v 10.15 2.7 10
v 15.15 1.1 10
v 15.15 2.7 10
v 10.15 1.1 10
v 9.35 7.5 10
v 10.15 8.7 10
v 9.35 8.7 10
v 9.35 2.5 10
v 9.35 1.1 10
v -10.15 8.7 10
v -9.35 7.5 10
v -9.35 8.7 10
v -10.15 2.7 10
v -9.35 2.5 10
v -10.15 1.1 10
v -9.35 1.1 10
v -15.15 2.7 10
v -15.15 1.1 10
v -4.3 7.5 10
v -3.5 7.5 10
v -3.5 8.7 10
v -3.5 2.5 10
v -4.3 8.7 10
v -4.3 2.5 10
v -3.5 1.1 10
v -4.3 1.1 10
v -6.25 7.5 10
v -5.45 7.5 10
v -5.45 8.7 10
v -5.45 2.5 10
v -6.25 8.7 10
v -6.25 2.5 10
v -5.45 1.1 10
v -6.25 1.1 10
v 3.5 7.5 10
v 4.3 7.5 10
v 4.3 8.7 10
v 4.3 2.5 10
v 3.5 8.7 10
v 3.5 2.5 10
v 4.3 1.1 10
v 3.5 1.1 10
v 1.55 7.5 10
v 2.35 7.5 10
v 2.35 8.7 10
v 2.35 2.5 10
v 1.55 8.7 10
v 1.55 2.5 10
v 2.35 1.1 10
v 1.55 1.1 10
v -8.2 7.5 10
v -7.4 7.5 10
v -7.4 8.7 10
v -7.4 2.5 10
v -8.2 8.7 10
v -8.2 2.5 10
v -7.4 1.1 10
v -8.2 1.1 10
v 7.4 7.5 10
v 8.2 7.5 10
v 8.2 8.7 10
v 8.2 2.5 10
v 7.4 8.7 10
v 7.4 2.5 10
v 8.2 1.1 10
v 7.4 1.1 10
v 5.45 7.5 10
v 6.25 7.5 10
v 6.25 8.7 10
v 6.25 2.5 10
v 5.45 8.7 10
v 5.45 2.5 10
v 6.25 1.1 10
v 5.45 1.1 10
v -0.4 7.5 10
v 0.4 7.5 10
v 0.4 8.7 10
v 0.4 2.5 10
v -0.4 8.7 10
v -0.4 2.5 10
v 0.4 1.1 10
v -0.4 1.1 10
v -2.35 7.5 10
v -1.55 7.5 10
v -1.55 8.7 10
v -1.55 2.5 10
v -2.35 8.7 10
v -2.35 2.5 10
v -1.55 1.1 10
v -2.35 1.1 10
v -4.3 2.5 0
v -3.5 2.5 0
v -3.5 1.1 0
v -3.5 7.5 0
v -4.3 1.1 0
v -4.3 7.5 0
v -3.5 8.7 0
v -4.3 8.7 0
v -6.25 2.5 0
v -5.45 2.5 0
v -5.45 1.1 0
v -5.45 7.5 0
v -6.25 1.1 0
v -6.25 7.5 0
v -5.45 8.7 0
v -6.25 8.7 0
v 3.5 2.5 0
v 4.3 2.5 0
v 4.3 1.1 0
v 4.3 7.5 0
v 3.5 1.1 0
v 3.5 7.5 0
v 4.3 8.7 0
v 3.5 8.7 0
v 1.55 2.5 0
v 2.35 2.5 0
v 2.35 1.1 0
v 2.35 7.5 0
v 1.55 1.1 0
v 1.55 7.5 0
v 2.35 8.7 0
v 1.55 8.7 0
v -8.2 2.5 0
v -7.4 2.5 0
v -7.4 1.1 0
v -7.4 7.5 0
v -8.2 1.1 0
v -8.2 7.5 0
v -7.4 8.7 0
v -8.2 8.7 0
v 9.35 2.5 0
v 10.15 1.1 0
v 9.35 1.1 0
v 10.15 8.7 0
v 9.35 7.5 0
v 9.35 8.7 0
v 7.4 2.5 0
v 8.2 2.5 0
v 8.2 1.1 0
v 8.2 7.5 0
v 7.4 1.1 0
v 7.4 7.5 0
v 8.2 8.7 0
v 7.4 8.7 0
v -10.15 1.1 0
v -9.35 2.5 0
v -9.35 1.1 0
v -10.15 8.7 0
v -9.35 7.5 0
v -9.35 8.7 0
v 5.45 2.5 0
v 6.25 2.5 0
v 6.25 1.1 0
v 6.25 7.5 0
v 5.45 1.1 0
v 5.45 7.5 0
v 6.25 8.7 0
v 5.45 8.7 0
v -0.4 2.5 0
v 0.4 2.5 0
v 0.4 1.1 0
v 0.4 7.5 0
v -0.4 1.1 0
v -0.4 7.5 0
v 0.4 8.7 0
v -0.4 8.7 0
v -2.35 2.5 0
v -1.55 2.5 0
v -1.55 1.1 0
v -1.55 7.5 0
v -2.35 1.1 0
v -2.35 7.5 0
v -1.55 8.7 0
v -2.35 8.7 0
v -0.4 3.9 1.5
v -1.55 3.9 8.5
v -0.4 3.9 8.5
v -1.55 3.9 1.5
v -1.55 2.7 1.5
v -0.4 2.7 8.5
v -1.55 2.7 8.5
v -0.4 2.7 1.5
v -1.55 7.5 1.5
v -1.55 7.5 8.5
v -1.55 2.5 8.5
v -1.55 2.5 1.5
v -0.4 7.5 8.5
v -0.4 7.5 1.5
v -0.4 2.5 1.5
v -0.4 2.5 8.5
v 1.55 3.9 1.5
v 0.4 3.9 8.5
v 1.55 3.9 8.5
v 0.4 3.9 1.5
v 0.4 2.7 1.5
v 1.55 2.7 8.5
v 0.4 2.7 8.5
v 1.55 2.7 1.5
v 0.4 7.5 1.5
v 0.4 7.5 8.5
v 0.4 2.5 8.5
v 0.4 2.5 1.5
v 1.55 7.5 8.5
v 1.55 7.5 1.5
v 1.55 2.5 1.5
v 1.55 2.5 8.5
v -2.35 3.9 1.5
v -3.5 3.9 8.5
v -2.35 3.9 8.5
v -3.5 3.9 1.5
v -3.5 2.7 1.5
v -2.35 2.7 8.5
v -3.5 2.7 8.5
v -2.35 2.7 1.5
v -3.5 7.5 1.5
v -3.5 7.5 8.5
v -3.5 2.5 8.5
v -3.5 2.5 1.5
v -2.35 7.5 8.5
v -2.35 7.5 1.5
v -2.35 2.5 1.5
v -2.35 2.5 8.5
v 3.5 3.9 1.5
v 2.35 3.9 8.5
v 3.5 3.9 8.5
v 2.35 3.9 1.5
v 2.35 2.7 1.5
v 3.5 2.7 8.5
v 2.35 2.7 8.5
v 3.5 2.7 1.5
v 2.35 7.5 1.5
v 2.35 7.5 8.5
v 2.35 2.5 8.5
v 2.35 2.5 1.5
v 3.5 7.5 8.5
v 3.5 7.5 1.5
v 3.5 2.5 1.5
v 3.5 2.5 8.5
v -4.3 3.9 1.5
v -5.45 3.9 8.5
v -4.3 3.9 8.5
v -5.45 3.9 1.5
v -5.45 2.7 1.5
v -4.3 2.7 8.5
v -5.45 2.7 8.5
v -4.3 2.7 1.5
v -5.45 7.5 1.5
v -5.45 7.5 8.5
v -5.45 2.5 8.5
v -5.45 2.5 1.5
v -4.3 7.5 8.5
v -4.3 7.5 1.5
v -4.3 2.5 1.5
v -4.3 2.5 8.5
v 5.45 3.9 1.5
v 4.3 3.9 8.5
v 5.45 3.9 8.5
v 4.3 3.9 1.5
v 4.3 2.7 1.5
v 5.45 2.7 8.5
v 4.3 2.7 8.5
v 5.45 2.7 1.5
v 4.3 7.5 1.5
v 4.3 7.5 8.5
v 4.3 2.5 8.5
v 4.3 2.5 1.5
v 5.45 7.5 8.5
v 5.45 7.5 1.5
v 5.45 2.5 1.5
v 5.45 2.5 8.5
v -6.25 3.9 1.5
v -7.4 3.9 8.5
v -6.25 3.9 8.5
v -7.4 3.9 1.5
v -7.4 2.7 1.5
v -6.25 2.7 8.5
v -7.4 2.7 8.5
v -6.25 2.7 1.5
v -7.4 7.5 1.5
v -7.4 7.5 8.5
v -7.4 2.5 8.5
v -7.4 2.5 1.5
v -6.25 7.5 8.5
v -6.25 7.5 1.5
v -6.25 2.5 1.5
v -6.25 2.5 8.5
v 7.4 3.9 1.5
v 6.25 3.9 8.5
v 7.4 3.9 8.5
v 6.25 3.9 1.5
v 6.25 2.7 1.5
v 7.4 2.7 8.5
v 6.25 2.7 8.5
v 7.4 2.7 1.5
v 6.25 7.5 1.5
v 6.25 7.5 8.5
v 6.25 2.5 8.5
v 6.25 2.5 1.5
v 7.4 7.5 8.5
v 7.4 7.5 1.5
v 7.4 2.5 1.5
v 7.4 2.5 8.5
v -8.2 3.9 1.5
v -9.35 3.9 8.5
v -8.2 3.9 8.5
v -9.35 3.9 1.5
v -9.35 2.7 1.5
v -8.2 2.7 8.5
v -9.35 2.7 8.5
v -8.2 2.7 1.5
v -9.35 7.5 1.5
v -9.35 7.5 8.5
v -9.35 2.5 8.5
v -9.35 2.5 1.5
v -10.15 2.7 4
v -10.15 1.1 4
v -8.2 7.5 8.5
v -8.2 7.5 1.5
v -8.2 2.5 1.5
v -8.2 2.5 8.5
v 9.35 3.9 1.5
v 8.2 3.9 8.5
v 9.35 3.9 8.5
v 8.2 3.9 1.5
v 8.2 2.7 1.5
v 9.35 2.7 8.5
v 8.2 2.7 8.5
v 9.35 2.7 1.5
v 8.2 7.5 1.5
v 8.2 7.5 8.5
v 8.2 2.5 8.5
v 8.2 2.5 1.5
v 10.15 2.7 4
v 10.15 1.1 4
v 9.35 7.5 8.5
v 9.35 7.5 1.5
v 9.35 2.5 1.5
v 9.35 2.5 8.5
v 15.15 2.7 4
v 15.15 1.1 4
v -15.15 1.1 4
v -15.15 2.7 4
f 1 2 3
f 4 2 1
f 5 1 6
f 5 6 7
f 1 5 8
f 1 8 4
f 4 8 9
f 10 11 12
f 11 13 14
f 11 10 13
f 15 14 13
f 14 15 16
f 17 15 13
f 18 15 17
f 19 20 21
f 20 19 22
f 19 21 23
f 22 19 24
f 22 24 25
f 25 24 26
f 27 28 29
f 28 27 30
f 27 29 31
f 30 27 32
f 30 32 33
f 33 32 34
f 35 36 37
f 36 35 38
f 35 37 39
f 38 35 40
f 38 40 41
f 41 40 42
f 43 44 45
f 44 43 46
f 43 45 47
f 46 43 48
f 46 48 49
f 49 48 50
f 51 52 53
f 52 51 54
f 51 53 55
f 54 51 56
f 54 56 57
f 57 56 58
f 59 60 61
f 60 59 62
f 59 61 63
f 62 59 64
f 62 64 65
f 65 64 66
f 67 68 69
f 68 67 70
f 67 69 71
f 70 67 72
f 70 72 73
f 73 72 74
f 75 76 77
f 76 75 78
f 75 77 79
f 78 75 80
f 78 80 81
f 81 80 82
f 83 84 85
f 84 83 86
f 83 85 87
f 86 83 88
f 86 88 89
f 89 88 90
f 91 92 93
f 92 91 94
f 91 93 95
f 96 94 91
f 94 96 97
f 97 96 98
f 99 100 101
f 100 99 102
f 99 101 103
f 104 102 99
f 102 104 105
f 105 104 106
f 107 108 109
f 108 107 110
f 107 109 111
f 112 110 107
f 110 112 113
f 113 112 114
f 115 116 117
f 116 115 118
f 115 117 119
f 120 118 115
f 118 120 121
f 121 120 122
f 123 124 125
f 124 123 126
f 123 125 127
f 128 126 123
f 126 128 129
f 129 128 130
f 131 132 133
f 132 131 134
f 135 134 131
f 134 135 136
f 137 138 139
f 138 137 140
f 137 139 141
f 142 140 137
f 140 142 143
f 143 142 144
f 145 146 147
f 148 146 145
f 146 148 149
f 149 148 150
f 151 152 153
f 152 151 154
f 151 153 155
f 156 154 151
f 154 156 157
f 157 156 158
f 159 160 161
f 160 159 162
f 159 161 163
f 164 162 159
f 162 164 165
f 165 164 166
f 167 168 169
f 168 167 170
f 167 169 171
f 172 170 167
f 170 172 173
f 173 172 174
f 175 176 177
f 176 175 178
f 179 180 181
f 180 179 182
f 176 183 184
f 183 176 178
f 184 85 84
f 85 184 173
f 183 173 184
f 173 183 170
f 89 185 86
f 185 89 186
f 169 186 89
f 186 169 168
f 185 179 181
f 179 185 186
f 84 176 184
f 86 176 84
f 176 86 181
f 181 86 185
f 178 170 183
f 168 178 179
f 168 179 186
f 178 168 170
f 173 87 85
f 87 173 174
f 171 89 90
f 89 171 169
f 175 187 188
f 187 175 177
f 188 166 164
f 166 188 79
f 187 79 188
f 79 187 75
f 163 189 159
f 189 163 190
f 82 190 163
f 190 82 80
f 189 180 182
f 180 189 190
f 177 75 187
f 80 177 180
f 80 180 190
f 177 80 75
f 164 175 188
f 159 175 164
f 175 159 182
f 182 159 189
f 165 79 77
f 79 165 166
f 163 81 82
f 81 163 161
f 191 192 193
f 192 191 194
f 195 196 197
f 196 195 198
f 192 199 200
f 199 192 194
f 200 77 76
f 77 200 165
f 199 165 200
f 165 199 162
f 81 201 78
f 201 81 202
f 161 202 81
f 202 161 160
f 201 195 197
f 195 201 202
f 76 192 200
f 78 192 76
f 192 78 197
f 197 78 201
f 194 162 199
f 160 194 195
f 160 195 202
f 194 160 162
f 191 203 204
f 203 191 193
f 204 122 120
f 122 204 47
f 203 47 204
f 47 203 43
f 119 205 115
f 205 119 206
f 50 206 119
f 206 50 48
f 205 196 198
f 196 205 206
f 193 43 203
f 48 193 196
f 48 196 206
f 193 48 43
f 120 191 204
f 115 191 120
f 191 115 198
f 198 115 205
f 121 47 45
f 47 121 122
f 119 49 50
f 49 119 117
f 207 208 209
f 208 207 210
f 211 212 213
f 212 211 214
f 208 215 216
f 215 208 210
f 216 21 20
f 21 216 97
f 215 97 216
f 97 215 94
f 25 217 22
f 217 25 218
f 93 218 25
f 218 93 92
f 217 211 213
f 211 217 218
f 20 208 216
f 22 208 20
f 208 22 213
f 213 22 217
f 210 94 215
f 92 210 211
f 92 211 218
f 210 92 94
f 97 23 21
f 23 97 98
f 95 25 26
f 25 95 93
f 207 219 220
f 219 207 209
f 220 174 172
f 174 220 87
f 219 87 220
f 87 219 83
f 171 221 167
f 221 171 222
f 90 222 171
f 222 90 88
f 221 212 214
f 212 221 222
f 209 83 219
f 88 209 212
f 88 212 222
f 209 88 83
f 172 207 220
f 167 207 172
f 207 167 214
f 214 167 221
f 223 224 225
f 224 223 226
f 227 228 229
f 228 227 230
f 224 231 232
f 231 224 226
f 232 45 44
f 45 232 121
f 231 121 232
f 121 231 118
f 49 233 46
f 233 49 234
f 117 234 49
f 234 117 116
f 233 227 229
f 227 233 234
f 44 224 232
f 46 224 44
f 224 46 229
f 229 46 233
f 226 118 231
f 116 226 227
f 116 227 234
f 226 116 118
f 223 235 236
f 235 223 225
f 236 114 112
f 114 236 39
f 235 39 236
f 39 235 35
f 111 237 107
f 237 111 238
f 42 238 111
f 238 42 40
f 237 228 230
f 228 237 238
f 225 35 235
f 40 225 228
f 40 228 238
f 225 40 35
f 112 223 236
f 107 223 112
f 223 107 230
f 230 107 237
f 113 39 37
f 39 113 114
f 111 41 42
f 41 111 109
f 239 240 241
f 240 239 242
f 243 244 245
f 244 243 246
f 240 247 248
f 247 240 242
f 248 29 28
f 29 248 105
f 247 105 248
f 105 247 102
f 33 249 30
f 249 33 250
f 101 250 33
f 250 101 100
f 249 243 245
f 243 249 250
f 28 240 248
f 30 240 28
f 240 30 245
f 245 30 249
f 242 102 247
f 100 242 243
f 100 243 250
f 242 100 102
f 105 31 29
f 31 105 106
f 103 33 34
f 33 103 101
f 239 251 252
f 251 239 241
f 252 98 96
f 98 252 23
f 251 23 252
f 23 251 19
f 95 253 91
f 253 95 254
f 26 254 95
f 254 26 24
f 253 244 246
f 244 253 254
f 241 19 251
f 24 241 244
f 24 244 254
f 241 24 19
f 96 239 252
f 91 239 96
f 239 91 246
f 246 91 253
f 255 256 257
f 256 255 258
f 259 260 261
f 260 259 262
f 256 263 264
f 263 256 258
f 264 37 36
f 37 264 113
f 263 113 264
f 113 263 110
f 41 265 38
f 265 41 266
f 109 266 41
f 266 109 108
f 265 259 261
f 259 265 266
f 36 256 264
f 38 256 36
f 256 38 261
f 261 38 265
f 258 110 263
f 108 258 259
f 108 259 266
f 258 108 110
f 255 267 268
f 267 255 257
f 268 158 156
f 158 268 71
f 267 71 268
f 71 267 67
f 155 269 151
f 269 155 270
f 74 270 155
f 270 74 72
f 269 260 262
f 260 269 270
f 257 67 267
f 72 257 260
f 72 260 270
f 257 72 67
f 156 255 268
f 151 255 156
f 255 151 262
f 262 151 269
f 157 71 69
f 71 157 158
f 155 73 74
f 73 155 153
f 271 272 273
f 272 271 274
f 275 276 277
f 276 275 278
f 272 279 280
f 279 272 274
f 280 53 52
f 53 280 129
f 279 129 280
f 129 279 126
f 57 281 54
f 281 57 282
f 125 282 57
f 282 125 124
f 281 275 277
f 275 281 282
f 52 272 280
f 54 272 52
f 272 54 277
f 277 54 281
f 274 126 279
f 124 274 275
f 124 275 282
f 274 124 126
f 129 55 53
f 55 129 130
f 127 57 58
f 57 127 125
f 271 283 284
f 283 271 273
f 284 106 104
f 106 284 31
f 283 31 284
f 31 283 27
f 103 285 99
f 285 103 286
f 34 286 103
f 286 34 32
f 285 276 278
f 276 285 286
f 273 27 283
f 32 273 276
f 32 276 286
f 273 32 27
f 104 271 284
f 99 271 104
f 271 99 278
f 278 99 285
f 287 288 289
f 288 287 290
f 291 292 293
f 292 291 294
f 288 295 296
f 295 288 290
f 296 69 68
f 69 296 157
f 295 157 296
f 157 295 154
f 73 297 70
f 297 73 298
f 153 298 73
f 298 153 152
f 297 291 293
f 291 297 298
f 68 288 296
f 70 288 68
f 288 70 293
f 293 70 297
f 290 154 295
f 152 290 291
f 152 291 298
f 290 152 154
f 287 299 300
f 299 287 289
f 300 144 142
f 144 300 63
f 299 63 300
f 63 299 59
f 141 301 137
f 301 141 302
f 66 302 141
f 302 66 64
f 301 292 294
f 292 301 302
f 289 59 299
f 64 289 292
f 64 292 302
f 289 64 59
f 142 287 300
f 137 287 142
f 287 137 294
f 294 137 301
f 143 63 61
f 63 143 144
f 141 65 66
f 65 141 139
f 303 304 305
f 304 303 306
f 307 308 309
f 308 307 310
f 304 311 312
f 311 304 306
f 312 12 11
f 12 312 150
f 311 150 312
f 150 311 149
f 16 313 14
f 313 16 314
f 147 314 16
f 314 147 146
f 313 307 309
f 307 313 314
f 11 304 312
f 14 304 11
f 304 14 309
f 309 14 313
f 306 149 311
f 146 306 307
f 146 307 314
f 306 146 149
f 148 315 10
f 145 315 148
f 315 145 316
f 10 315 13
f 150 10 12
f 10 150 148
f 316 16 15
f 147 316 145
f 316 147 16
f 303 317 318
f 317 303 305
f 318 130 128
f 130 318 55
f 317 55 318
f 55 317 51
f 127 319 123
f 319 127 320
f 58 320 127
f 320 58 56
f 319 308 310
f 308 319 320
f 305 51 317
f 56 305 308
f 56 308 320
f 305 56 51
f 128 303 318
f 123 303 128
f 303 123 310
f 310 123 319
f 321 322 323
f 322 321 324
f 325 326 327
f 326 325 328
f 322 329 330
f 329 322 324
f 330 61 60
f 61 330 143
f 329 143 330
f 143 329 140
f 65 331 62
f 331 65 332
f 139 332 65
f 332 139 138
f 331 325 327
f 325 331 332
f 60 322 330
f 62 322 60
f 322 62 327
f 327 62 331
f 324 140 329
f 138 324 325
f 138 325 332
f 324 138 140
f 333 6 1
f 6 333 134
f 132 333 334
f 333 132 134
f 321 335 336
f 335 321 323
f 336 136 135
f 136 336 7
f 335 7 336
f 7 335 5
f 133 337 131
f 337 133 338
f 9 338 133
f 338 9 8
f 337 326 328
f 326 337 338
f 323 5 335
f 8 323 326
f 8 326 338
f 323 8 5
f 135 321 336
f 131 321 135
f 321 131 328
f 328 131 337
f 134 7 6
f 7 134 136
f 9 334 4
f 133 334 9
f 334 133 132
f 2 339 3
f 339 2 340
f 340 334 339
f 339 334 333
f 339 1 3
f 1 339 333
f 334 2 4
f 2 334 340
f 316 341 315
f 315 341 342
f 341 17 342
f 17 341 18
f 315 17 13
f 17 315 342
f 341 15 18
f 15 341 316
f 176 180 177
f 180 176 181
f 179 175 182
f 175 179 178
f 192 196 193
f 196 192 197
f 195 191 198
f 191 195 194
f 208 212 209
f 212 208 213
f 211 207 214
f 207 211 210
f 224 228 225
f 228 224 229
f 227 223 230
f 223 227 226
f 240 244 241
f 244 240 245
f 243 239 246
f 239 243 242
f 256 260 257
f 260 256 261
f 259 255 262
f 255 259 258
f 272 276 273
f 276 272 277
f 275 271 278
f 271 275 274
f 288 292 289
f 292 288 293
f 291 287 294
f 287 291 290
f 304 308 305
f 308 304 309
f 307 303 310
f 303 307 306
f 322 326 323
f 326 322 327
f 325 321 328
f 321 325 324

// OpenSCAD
/*
 * ppk_usb
 *
 * Copyright (C) 2014 cy384
 * All rights reserved.
 *
 * This software may be modified and distributed under the terms
 * of the BSD license. See the LICENSE file for details.
 */

// 3d printable adapter for palm-V era devices

module pin()
{
	translate([-1.95/2, -0.8, 0])
	{
		cube(size = [1.95, 1.20, 10.00], center = false);
	}

	translate([(-1.95/2)-0.4, -2.4, 0])
	{
		cube(size = [0.80, 7.60, 10.00], center = false);
	}

	translate([(+1.95/2)-0.4, -2.4, 0])
	{
		cube(size = [0.80, 7.60, 10.00], center = false);
	}
}

module hole()
{
	translate([0, 5.00, 10.00])
	{
		cube(size = [1.15, 5.00, 3.00], center = true);
	}

	translate([0, 5.00, 0.00])
	{
		cube(size = [1.15, 5.00, 3.00], center = true);
	}
}

module palm_v_adapter()
{
	difference()
	{
		union()
		{
			// space for each pin
			for (i = [0 : 4])
			{
				translate([-((1.95/2)+(1.95*i)), 3.5, 0]) pin();
				translate([(1.95/2)+(1.95*i), 3.5, 0]) pin();
			}

			// ears
			translate ([12.65, 1.90, 7]) cube ([5.0, 1.6, 6], center = true);
			translate ([-12.65, 1.90, 7]) cube ([5.0, 1.6, 6], center = true);
		}

		// make holes for the contacts
		for (i = [0 : 4])
		{
			translate([-((1.95/2)+(1.95*i)), 0, 0]) hole();
			translate([(1.95/2)+(1.95*i), 0, 0]) hole();
		}
	}
}

palm_v_adapter();
